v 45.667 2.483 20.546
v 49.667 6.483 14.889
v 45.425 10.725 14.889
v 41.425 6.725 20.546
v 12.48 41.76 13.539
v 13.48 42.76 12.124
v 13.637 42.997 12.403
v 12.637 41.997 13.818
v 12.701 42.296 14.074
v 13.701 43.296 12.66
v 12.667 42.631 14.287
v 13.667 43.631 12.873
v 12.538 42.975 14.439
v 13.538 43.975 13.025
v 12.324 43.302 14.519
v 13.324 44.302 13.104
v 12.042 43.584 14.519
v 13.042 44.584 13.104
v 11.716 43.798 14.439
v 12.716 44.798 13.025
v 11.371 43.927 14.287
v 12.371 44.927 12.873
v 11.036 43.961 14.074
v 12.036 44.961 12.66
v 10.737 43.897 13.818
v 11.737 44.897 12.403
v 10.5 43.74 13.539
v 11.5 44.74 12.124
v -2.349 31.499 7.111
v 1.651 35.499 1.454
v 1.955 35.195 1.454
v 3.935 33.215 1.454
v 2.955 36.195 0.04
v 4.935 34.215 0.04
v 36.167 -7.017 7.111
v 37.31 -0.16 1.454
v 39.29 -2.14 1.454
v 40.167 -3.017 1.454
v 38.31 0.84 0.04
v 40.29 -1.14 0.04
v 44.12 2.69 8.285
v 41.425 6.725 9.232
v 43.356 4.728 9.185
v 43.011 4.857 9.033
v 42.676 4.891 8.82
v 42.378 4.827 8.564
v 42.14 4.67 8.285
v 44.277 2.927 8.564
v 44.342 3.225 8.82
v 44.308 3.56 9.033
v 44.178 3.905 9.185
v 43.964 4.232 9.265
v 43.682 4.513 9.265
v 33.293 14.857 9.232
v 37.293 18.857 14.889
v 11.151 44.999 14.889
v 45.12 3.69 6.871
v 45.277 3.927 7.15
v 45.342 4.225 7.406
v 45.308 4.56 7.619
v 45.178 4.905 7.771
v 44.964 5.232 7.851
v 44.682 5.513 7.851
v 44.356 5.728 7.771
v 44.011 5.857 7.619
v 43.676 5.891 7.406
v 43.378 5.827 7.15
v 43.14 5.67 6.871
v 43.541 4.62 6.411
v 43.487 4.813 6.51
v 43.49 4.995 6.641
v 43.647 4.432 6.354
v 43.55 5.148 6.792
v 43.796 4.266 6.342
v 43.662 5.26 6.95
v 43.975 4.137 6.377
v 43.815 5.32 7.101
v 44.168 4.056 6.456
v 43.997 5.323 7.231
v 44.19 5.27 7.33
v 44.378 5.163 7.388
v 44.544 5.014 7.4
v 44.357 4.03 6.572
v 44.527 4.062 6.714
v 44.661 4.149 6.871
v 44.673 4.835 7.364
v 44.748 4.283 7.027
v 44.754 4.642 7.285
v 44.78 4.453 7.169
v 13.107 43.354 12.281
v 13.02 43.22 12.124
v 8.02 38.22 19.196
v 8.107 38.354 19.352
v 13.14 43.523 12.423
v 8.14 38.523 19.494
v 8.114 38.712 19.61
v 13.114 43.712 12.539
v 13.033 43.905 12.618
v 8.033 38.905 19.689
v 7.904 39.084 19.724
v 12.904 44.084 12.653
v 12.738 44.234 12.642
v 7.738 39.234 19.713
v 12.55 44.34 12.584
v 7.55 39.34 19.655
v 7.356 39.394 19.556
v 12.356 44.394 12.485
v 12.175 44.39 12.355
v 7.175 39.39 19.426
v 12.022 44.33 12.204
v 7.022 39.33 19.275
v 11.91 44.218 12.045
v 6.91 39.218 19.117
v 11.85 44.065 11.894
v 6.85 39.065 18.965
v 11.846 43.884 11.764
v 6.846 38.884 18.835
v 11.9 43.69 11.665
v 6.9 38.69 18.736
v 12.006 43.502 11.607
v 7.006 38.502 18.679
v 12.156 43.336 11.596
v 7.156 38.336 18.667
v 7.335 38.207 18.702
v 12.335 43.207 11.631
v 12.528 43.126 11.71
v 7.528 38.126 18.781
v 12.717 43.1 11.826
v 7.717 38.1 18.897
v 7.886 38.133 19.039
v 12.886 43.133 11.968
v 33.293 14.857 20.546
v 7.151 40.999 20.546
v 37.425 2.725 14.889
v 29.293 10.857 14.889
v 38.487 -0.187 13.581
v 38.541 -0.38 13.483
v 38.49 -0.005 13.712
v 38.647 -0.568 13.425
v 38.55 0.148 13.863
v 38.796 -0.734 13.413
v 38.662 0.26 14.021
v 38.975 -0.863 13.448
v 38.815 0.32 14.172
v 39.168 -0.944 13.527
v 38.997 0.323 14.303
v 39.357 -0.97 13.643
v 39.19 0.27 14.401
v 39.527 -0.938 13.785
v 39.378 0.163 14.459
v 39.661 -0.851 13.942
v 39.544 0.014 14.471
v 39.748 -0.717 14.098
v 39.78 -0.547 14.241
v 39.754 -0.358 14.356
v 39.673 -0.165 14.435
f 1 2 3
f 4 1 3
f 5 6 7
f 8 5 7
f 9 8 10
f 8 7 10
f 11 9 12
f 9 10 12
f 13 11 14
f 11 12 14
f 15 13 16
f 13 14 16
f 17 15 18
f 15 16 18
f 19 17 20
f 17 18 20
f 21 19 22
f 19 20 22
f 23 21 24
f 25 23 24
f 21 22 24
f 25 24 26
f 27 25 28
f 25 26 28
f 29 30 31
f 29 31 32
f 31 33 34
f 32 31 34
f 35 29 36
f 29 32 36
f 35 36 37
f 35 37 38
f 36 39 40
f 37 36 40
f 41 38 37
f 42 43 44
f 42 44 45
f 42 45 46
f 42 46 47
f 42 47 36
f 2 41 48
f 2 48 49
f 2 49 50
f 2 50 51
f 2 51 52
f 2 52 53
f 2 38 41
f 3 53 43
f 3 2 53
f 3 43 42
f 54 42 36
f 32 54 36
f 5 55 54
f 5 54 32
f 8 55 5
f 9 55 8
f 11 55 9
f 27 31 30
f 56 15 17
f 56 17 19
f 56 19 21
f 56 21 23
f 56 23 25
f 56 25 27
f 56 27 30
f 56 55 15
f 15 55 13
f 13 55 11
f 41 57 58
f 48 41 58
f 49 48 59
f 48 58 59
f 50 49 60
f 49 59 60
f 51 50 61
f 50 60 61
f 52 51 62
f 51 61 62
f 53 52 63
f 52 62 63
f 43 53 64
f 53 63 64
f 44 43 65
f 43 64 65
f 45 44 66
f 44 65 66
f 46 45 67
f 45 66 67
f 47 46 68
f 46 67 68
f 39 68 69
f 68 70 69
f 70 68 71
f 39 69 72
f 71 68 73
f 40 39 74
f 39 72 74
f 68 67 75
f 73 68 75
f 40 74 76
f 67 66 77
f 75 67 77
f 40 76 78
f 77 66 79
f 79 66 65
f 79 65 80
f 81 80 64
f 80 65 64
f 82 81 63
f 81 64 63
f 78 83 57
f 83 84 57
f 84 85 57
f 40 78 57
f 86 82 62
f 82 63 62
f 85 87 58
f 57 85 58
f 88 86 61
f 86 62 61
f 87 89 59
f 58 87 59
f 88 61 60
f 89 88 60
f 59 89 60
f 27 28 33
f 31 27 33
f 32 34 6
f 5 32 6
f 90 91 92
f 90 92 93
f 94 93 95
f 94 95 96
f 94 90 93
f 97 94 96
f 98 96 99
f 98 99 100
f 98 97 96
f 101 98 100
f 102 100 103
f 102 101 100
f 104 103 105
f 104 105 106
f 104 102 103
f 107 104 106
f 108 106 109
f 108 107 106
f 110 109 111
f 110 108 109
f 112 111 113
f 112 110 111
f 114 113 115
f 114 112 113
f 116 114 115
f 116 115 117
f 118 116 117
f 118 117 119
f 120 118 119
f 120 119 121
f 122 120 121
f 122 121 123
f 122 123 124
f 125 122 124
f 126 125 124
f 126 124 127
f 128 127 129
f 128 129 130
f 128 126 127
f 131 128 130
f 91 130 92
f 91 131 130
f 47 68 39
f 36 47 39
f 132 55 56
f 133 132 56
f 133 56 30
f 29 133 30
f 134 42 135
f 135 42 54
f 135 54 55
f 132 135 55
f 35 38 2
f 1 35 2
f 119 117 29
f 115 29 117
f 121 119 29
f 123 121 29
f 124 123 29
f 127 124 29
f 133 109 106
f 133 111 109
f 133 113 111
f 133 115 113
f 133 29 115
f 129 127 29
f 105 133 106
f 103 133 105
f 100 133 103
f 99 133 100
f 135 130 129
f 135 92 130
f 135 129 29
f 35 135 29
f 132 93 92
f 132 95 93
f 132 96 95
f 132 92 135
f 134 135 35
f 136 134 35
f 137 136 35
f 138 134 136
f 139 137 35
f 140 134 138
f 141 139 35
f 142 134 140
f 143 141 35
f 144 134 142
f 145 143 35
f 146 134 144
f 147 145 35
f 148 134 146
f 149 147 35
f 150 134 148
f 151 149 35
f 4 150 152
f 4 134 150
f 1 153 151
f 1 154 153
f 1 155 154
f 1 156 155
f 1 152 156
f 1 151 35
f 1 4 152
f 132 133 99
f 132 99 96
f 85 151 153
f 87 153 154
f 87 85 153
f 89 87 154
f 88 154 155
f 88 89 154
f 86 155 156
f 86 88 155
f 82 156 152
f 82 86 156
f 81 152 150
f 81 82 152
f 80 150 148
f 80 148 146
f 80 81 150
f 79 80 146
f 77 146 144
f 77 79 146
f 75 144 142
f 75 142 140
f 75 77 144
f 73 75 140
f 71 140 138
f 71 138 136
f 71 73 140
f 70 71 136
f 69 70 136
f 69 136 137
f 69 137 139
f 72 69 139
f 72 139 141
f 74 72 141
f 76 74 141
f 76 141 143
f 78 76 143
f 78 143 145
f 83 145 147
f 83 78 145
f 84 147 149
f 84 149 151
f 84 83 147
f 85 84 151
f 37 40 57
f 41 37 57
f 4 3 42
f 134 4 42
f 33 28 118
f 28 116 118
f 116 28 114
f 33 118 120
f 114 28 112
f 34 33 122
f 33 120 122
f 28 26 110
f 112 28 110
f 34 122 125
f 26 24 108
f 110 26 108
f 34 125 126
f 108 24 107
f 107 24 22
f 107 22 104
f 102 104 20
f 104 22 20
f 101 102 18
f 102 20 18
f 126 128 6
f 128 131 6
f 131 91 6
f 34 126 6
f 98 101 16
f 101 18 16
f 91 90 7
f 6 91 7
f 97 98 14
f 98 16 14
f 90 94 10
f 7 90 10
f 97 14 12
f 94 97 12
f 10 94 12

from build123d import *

# Parameters (mm, degrees)
SKETCH001_R             = 0.75
PAD_DEPTH               = 10
POCKET001_DEPTH         = 5
POCKET002_DEPTH         = 2
BODY001_ROLL_ANGLE      = 44.999986
BODY001_PITCH_ANGLE     = -3.6e-05
BODY001_PLACEMENT_ANGLE = -44.999986


with BuildPart() as part:
    # Sketch001 → Pad (new body)
    with BuildSketch(Plane.XY):
        Polygon((-26.02, -9.66), (28.45, -9.66), (28.45, 9.34), (22.45, 9.34), (22.45, 1.34), (10.95, 1.34), (10.95, 9.34), (-26.02, 9.34), align=None)
        with Locations((-24.19, 7.43)):
            Circle(SKETCH001_R, mode=Mode.SUBTRACT)
        with Locations((25.81, 0)):
            Circle(SKETCH001_R, mode=Mode.SUBTRACT)
    extrude(amount=PAD_DEPTH)

    # Sketch007 → Pocket001 (cut)
    with BuildSketch(Plane.XY):
        with BuildLine():
            Line((-26.02, -9.66), (-26.02, 9.34))
            Line((-26.02, 9.34), (28.45, 9.34))
            Line((28.45, 9.34), (28.45, -9.66))
            Line((27.21, -9.66), (28.45, -9.66))
            Line((27.21, -9.66), (27.21, 0))
            ThreePointArc((27.21, 0), (25.81, 1.4), (24.41, 0))
            Line((24.41, 0), (24.41, -9.66))
            Line((-22.79, -9.66), (24.41, -9.66))
            Line((-22.79, -9.66), (-22.79, 7.43))
            ThreePointArc((-22.79, 7.43), (-24.19, 8.83), (-25.59, 7.43))
            Line((-25.59, 7.43), (-25.59, -9.66))
            Line((-26.02, -9.66), (-25.59, -9.66))
        make_face()
    extrude(amount=-POCKET001_DEPTH, mode=Mode.SUBTRACT)

    # Sketch007 → Pocket002 (cut)
    with BuildSketch(Plane.XY):
        with BuildLine():
            Line((-26.02, -9.66), (-26.02, 9.34))
            Line((-26.02, 9.34), (28.45, 9.34))
            Line((28.45, 9.34), (28.45, -9.66))
            Line((27.21, -9.66), (28.45, -9.66))
            Line((27.21, -9.66), (27.21, 0))
            ThreePointArc((27.21, 0), (25.81, 1.4), (24.41, 0))
            Line((24.41, 0), (24.41, -9.66))
            Line((-22.79, -9.66), (24.41, -9.66))
            Line((-22.79, -9.66), (-22.79, 7.43))
            ThreePointArc((-22.79, 7.43), (-24.19, 8.83), (-25.59, 7.43))
            Line((-25.59, 7.43), (-25.59, -9.66))
            Line((-26.02, -9.66), (-25.59, -9.66))
        make_face()
    extrude(amount=POCKET002_DEPTH, mode=Mode.SUBTRACT)


with BuildPart() as part_1:
    # Body001 roll: moved
    add(part.part.rotate(Axis((0, 0, 0), (1, 0, 0)), BODY001_ROLL_ANGLE))


with BuildPart() as part_2:
    # Body001 pitch: moved
    add(part_1.part.rotate(Axis((0, 0, 0), (0, 1, 0)), BODY001_PITCH_ANGLE))


with BuildPart() as part_3:
    # Body001 placement: moved
    add(part_2.part.moved(Location((25.88, 22.93, 6.87071))).rotate(Axis((25.88, 22.93, 6.87071), (0, 0, 1)), BODY001_PLACEMENT_ANGLE))


solid = part_3.part
